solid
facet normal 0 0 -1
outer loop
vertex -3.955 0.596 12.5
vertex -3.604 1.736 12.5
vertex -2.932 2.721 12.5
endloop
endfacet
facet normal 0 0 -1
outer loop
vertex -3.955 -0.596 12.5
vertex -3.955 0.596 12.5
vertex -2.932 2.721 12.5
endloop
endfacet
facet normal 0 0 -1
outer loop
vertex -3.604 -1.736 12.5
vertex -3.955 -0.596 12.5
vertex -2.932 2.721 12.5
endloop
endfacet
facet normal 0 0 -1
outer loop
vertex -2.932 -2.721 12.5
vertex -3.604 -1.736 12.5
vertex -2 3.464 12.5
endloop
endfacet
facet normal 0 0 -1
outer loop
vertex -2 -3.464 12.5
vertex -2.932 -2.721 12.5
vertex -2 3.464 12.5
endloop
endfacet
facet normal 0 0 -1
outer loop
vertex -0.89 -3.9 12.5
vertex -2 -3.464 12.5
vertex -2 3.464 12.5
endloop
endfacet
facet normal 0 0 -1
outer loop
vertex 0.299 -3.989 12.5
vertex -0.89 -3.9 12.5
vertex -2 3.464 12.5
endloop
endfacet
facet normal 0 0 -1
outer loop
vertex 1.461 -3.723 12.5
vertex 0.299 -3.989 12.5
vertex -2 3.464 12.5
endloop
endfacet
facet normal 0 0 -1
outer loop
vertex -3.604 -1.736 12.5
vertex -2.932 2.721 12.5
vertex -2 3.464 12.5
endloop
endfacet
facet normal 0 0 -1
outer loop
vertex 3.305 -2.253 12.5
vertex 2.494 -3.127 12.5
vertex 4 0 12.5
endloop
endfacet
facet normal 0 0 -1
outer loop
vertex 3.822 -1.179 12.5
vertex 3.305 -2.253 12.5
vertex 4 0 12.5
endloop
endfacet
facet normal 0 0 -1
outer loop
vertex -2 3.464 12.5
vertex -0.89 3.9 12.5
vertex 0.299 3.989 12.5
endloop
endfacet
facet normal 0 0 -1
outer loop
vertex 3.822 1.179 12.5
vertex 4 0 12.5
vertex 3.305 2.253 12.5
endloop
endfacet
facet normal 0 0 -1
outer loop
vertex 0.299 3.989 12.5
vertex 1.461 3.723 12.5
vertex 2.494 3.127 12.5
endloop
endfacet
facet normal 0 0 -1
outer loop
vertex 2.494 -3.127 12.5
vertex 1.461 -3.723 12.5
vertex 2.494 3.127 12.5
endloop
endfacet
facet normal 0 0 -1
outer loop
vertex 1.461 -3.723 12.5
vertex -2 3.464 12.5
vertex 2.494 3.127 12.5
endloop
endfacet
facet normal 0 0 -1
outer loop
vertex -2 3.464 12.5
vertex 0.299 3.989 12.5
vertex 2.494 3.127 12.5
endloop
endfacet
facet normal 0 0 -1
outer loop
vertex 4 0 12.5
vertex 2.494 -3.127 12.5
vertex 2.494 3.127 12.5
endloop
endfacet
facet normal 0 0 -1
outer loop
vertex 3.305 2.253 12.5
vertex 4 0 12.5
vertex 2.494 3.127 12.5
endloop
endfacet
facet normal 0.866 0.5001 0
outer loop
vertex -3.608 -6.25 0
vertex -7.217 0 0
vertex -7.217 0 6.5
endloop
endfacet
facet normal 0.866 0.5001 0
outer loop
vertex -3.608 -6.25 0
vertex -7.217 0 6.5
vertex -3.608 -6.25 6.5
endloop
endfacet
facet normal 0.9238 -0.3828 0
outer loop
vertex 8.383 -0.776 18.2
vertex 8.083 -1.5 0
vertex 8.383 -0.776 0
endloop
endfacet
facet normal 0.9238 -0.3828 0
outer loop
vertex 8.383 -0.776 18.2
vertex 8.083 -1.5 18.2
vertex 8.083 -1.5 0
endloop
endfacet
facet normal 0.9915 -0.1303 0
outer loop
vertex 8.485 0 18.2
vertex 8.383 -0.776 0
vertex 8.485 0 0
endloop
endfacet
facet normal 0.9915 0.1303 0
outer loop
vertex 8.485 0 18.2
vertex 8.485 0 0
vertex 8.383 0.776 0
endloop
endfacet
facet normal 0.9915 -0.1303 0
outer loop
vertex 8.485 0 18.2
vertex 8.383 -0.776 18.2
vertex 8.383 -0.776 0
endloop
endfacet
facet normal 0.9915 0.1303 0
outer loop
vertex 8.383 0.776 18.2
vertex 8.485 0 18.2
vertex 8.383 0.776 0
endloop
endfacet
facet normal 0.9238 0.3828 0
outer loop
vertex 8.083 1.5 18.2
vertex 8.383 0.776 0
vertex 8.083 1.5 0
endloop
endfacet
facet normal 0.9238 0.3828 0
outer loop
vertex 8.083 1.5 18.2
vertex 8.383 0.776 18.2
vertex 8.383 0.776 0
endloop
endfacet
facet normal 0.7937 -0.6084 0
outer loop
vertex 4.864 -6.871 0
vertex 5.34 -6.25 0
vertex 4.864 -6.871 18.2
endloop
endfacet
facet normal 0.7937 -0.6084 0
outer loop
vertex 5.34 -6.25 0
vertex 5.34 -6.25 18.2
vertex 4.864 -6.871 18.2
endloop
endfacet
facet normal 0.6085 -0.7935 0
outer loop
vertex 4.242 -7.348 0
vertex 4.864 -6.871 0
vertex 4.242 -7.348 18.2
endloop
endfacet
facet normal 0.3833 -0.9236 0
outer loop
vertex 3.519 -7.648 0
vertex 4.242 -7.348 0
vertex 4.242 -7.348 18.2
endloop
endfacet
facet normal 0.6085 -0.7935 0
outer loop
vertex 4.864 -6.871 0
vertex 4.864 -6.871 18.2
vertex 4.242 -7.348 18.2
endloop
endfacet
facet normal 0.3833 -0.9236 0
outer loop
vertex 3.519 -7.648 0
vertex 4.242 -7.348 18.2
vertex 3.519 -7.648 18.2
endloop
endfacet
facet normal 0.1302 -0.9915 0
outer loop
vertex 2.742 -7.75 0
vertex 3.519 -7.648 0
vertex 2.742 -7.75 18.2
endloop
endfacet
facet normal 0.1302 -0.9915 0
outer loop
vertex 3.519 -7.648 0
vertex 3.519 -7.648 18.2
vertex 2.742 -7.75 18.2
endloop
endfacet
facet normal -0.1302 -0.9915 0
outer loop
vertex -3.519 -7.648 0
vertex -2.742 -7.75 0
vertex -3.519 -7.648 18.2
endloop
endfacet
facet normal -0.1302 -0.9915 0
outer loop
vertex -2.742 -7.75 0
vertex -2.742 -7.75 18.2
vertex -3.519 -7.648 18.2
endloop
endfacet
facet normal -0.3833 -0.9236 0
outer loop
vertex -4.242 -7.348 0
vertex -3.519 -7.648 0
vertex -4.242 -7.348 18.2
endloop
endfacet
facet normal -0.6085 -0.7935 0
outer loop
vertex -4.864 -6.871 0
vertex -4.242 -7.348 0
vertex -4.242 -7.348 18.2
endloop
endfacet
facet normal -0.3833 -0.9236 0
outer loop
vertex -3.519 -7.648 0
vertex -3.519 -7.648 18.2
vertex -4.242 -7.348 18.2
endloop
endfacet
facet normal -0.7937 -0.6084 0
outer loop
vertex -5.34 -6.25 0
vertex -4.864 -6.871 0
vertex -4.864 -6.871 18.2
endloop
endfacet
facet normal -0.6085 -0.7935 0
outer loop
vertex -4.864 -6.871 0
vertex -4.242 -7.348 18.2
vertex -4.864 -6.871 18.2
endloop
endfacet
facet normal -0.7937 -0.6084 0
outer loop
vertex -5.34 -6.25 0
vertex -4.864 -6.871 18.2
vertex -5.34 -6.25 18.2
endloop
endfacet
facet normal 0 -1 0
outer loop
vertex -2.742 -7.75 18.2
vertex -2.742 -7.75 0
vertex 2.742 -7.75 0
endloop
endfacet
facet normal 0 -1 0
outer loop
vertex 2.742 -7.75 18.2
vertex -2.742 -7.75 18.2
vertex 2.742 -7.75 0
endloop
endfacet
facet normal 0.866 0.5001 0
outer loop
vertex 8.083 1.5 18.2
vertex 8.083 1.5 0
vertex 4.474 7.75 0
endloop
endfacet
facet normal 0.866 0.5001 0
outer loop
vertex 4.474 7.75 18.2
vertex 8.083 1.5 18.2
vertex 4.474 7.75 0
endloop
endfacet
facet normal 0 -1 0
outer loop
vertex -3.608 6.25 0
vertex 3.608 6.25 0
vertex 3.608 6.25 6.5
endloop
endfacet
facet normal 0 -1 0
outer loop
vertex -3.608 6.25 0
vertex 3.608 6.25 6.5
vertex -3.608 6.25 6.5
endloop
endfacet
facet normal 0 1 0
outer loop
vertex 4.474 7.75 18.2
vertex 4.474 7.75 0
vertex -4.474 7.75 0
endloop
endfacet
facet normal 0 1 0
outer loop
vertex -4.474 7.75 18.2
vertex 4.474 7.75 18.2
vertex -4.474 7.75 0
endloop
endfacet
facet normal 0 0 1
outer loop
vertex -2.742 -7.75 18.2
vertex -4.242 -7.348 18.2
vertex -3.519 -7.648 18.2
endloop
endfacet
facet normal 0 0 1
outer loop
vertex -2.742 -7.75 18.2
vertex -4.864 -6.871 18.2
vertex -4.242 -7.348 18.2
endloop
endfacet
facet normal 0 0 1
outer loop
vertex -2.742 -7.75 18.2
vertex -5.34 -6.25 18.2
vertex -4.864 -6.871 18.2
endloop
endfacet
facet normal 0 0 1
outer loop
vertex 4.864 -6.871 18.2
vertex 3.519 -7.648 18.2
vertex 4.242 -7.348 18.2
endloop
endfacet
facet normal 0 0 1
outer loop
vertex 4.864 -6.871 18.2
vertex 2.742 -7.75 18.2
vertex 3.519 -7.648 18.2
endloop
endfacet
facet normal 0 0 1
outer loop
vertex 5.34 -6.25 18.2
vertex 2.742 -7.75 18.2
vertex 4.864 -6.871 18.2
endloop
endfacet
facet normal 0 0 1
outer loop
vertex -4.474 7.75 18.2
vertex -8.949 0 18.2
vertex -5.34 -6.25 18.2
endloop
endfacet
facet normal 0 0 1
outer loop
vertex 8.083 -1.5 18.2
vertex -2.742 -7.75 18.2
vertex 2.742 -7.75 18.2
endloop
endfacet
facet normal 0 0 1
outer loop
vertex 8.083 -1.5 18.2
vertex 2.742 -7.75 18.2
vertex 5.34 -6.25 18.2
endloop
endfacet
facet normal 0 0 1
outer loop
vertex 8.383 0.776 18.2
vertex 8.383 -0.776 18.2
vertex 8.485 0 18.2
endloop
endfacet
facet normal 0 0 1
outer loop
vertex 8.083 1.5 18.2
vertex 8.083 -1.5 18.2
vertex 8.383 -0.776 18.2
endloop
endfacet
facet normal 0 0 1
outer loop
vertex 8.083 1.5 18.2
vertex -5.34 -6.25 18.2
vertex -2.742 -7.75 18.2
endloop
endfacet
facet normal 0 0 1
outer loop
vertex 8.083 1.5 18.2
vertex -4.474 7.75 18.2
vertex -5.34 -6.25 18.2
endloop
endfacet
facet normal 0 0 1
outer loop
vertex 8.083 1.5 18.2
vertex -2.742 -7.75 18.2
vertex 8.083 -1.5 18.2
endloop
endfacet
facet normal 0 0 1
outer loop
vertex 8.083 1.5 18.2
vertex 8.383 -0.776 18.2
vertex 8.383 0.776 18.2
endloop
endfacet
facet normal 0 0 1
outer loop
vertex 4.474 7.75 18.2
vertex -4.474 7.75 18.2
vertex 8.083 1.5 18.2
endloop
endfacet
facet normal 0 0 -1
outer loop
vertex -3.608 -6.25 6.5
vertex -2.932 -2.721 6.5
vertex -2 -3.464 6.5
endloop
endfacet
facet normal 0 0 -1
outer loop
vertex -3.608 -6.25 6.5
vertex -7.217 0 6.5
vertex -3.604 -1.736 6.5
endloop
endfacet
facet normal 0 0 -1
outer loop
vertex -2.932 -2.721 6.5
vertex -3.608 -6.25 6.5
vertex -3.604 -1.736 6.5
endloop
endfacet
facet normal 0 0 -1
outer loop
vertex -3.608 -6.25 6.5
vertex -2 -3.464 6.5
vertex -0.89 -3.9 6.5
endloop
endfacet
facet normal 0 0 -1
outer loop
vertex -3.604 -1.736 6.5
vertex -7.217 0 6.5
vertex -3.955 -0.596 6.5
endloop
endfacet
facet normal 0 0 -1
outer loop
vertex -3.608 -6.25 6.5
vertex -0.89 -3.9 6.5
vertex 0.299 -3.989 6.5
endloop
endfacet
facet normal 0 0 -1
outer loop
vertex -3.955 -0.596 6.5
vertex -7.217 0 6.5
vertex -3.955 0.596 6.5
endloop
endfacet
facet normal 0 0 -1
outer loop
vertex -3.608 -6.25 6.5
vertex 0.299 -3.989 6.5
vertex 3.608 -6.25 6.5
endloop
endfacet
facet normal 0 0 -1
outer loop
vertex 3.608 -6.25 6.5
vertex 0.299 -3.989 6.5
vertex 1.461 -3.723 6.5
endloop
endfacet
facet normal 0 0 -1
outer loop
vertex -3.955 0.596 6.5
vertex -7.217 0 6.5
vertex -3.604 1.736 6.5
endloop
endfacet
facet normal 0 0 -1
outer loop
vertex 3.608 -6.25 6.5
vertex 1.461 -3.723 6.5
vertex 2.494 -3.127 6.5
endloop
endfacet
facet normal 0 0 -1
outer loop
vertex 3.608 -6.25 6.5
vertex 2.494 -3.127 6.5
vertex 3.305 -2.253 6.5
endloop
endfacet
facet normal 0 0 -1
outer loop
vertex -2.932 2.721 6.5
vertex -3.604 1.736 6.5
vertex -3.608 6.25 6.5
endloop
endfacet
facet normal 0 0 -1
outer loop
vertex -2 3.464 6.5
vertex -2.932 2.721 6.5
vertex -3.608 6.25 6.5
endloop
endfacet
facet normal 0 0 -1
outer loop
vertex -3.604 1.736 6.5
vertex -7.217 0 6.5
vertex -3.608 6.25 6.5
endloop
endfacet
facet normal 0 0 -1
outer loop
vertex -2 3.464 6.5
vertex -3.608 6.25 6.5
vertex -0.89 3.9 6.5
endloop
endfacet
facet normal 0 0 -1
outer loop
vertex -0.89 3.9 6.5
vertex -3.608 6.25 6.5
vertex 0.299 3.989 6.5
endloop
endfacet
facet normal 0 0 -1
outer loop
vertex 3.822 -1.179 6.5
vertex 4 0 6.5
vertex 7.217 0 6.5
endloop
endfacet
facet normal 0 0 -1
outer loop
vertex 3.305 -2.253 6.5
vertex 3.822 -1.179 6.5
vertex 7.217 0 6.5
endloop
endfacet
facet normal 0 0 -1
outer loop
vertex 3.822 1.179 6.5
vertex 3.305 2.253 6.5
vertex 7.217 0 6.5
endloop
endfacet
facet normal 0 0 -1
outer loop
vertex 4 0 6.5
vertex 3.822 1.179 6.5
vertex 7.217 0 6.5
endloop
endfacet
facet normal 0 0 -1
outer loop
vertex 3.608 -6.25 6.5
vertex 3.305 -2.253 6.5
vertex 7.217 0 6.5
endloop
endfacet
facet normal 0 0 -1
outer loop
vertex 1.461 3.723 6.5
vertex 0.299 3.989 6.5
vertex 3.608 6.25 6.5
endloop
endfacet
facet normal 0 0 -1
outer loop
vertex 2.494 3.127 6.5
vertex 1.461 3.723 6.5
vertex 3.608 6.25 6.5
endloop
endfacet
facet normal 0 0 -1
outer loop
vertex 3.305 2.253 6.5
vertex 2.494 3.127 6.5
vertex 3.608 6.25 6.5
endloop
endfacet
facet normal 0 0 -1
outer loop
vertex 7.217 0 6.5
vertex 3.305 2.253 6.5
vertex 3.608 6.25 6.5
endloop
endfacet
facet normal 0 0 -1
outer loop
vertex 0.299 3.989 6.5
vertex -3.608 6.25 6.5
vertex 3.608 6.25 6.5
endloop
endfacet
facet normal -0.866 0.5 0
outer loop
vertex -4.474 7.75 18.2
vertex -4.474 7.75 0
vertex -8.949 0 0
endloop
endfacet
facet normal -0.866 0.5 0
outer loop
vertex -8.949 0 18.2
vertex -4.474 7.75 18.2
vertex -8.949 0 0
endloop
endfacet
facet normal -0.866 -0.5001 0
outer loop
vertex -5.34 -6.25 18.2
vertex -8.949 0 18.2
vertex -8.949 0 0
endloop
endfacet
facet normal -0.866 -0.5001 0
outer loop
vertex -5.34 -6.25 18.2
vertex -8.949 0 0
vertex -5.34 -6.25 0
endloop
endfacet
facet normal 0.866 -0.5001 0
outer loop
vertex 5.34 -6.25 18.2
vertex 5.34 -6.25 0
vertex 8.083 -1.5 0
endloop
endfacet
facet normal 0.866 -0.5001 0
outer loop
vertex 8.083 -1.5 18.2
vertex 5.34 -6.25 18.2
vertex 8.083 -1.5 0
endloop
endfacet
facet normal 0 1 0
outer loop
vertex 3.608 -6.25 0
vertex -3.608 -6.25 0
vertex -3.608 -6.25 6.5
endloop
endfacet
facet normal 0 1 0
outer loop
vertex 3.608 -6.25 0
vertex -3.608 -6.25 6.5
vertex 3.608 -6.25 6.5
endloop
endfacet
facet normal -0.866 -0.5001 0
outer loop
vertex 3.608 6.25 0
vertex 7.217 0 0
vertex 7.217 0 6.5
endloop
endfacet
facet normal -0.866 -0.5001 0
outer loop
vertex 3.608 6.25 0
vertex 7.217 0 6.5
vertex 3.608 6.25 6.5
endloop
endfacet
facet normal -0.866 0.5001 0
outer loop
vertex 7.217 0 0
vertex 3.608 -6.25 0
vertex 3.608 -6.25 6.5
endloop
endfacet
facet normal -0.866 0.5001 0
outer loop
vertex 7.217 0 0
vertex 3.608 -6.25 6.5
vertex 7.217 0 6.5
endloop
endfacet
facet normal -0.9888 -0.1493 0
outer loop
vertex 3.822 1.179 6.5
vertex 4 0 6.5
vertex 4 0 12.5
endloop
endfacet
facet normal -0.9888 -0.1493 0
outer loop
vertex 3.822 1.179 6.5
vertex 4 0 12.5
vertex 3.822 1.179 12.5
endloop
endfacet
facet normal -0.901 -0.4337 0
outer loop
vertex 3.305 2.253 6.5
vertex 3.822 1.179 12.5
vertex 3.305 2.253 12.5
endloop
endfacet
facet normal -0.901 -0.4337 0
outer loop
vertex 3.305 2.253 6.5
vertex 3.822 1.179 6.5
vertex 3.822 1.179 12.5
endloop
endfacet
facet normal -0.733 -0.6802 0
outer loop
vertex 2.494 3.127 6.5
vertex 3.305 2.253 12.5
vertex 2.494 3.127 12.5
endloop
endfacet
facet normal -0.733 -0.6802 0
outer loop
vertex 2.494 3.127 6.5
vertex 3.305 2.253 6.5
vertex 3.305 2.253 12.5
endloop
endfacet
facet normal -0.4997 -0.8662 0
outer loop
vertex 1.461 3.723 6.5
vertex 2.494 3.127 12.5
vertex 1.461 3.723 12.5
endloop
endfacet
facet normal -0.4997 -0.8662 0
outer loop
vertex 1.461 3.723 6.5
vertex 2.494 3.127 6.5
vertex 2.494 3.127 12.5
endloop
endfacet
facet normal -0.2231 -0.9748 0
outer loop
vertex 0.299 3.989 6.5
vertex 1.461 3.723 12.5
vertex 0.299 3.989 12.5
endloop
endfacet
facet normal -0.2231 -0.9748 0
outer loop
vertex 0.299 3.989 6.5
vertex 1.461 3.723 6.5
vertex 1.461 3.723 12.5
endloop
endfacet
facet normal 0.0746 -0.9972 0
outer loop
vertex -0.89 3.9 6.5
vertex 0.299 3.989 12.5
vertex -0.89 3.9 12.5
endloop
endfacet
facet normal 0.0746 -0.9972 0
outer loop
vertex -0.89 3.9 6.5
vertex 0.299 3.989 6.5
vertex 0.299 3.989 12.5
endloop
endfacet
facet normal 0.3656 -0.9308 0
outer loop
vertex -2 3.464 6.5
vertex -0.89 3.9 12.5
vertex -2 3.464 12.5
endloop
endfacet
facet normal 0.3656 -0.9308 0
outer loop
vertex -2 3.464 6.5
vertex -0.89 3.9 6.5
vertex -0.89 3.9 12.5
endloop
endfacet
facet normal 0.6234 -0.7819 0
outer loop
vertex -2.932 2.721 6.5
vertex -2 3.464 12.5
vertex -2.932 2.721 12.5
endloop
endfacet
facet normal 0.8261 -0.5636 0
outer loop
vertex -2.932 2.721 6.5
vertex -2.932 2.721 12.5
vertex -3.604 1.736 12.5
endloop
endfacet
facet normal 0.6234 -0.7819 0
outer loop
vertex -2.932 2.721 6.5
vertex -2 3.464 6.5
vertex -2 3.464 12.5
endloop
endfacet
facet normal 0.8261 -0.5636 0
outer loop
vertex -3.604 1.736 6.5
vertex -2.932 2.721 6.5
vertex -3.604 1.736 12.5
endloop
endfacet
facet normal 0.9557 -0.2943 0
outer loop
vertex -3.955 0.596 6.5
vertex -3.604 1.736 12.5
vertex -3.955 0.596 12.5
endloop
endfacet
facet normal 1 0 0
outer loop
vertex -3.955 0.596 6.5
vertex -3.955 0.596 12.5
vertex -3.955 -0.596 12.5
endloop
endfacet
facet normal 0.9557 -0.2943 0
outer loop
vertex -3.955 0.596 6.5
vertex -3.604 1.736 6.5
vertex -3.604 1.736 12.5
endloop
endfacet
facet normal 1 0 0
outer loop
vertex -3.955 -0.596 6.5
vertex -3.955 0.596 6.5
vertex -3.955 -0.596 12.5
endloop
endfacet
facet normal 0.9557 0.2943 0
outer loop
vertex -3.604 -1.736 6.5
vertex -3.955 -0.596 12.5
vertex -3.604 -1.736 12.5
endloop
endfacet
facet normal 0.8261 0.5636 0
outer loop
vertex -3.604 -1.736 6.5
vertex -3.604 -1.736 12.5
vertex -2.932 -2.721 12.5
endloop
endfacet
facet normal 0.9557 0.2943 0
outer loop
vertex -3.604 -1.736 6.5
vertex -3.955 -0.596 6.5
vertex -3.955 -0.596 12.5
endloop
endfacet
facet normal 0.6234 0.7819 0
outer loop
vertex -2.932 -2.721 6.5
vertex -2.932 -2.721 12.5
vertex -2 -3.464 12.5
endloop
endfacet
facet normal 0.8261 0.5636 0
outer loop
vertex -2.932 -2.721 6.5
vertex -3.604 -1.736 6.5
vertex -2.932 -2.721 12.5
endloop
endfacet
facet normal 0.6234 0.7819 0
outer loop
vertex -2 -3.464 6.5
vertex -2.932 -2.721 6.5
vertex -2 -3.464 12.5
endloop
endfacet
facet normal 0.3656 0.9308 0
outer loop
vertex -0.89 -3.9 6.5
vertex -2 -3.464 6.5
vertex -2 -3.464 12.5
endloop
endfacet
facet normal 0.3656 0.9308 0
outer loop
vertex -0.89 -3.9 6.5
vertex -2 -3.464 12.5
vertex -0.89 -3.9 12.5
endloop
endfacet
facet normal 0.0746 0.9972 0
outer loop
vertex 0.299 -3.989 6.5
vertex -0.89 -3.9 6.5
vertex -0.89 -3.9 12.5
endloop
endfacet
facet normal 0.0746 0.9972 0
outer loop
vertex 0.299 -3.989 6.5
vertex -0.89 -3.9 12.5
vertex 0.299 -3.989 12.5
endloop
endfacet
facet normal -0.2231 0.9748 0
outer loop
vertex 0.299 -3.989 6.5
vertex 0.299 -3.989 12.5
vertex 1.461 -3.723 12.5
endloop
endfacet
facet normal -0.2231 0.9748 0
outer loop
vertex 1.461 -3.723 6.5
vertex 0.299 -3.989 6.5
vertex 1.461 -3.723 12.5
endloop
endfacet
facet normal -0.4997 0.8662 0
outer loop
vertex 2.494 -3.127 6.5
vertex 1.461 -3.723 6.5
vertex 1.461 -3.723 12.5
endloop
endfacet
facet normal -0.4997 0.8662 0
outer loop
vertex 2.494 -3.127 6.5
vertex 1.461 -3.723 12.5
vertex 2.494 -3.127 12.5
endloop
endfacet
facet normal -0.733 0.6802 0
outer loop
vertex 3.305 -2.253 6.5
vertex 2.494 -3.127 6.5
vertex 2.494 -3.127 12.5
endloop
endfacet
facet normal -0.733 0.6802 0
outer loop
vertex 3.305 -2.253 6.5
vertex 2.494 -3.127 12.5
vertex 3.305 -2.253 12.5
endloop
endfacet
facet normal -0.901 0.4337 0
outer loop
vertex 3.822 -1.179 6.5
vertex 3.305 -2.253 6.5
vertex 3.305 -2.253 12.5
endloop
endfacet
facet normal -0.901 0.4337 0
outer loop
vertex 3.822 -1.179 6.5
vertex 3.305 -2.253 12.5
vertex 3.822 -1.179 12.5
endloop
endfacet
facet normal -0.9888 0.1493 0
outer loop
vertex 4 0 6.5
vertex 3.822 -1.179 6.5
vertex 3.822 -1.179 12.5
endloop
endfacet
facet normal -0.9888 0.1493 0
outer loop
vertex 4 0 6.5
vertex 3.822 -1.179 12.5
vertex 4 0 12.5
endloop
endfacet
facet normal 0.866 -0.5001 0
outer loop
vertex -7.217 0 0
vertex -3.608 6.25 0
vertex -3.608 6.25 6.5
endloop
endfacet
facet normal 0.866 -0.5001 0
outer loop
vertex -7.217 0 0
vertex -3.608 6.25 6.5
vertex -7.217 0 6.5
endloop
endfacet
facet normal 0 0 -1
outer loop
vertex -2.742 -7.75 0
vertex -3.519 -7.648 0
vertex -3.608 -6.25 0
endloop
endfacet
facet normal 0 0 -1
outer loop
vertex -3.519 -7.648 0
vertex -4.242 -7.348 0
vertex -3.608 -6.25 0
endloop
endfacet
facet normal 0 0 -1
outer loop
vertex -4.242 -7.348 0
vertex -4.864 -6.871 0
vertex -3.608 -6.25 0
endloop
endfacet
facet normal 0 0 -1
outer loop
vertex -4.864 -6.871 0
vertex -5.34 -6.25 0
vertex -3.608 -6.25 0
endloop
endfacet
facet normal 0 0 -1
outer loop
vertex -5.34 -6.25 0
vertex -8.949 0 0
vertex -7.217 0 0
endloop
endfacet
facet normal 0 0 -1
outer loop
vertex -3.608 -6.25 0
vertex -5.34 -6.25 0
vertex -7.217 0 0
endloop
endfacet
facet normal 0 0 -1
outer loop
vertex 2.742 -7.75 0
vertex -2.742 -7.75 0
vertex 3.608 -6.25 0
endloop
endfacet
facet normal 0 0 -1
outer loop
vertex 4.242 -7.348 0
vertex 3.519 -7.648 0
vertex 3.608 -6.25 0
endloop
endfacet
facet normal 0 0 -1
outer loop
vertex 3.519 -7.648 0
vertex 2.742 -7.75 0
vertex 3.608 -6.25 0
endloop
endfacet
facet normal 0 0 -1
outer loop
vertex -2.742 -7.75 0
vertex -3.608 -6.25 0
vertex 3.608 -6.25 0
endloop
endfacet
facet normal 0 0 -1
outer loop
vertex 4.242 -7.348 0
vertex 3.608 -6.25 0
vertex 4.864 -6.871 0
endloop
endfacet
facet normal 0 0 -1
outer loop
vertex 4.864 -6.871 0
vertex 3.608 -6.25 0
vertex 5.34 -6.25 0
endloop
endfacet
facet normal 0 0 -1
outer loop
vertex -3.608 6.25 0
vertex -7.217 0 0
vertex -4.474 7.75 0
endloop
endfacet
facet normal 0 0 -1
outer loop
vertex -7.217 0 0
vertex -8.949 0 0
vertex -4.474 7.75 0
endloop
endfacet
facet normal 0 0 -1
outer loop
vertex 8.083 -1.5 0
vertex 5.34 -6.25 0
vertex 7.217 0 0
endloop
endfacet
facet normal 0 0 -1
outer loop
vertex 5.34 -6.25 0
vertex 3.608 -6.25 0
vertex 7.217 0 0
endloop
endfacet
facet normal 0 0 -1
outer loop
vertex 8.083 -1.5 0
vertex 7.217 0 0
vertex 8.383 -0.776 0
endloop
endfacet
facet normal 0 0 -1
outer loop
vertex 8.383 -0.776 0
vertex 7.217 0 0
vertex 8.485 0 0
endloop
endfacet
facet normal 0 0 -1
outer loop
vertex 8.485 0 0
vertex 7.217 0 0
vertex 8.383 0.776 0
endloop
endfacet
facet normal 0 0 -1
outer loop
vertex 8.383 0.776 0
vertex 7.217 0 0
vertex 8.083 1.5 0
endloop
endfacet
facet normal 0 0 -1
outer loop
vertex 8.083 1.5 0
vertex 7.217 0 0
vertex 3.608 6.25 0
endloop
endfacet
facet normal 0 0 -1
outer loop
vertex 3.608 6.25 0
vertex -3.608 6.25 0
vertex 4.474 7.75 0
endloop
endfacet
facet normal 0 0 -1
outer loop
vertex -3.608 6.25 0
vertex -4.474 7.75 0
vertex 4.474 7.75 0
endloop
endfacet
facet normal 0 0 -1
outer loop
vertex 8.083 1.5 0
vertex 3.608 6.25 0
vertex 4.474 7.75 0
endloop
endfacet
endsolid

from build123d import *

# Parameters (mm, degrees)
F1_DEPTH = 18.2
F3_DEPTH = 6.5
F4_R     = 4
F5_DEPTH = 12.5
F6_R     = 3


with BuildPart() as f1:
    # F0 (on Top) → F1 (new body)
    with BuildSketch(Plane.XY):
        Polygon((4.474465, -7.75), (8.948929, 0), (4.474465, 7.75), (-4.474465, 7.75), (-8.948929, 0), (-4.474465, -7.75), align=None)
    extrude(amount=F1_DEPTH)

    # F2 (on Top) → F3 (cut)
    with BuildSketch(Plane.XY):
        Polygon((3.608439, -6.25), (7.216878, 0), (3.608439, 6.25), (-3.608439, 6.25), (-7.216878, 0), (-3.608439, -6.25), align=None)
    extrude(amount=F3_DEPTH, mode=Mode.SUBTRACT)

    # F4 (on Top) → F5 (cut)
    with BuildSketch(Plane.XY):
        Circle(F4_R)
    extrude(amount=F5_DEPTH, mode=Mode.SUBTRACT)

    # F6
    f6_edges = [f1.edges().sort_by_distance(p)[0] for p in [
        (8.948929, 0, 9.1),
        (4.474465, -7.75, 9.1),
        (-4.474465, -7.75, 9.1),
    ]]
    fillet(f6_edges, radius=F6_R)


solid = f1.part
